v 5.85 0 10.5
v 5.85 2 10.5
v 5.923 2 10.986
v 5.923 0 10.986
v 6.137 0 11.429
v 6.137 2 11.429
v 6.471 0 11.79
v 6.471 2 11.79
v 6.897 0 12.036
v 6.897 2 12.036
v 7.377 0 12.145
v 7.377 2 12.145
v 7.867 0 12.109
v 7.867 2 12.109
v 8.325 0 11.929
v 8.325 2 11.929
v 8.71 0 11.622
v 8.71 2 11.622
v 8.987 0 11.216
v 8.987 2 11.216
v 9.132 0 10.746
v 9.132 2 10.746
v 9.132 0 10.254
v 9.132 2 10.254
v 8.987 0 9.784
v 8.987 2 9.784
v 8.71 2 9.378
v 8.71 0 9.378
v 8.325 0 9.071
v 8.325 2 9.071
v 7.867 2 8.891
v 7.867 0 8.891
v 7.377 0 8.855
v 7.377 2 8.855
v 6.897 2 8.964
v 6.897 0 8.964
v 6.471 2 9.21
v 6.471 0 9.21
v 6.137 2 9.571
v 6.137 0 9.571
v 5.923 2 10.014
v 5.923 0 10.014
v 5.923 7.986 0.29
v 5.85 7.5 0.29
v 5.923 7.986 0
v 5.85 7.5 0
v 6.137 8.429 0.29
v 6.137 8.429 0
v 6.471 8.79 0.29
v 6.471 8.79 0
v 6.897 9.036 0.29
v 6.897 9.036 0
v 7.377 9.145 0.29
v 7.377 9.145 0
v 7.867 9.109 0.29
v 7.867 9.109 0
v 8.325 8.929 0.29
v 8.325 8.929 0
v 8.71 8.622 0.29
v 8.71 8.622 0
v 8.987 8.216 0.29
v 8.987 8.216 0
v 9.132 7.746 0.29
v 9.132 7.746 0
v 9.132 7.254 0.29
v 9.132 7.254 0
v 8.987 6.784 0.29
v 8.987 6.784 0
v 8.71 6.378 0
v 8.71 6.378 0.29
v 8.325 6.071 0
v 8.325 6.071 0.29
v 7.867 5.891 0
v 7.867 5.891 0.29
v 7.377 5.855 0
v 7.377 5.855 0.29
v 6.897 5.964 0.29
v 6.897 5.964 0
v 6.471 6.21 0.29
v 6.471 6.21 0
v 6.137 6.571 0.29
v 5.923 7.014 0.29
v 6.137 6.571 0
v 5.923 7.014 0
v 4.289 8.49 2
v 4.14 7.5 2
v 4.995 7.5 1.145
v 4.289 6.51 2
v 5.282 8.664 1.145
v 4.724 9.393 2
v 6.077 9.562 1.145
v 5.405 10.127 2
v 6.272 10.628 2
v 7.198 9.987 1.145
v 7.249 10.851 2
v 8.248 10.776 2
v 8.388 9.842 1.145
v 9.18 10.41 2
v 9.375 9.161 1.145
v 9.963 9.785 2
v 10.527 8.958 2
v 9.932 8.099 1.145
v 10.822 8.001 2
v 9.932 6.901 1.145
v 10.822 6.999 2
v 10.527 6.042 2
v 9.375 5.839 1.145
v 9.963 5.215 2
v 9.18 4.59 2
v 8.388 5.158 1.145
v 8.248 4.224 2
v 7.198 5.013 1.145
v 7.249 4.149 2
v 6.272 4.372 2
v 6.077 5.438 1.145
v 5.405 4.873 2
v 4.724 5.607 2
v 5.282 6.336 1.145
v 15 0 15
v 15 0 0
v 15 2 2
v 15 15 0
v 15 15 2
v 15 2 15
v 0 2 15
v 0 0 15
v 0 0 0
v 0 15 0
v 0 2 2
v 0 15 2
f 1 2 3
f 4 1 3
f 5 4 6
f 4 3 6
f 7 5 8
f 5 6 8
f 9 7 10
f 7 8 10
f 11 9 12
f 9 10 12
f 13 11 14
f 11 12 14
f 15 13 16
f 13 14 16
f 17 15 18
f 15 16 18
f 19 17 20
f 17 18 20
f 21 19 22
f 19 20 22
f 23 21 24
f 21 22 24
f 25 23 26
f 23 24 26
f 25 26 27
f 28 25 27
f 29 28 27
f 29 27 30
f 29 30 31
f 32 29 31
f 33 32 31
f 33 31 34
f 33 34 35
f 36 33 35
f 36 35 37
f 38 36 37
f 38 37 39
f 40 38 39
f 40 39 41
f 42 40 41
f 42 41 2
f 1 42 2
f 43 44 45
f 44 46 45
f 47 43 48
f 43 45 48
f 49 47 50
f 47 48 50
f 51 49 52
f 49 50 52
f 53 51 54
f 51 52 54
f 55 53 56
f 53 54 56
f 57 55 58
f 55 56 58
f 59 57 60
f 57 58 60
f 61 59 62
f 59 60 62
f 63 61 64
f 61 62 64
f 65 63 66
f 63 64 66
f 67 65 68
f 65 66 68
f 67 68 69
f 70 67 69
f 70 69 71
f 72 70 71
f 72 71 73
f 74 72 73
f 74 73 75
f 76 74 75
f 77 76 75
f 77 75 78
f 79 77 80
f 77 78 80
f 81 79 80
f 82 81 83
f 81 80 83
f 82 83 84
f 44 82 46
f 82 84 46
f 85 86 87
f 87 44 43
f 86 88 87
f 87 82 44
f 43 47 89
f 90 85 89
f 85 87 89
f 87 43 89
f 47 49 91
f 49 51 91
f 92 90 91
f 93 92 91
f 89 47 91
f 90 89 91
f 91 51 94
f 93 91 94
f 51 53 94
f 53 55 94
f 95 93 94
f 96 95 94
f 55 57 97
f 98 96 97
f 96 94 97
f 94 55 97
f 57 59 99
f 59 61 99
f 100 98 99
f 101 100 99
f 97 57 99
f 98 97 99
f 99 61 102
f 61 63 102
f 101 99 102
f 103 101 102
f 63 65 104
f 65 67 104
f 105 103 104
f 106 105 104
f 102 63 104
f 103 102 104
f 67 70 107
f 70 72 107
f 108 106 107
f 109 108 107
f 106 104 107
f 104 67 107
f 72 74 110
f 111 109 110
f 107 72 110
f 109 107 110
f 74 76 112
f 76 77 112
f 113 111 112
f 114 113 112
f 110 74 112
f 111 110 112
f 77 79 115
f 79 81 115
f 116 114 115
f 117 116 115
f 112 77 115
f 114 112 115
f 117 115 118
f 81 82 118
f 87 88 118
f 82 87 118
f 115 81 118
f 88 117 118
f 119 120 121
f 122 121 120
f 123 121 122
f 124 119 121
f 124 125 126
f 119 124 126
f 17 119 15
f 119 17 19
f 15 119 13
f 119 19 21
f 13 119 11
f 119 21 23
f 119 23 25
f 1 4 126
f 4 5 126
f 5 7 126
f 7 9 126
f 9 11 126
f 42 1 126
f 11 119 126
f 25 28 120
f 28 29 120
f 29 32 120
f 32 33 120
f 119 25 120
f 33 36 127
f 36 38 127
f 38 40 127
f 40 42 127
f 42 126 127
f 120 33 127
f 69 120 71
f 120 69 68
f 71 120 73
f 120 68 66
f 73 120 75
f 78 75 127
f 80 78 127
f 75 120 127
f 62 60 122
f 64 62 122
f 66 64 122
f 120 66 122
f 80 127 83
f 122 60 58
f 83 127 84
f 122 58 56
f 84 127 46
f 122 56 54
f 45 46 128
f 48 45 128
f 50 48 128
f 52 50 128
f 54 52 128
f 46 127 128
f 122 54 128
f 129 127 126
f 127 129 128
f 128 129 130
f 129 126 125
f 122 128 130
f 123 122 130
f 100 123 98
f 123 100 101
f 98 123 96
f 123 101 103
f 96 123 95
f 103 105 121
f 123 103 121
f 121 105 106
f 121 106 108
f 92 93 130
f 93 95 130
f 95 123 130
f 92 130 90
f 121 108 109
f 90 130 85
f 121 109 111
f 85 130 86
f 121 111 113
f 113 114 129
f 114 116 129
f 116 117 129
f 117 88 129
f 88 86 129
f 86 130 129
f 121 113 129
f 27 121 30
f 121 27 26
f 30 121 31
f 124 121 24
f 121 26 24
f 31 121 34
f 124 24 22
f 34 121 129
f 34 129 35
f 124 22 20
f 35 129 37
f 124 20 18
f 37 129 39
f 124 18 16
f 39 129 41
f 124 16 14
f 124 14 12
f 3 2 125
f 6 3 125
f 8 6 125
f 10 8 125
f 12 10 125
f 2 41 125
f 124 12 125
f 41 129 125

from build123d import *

# Parameters (mm, degrees)
F1_DEPTH       = 15
F3_D           = 3.3
F5_D           = 3.3
F5_CSINK_D     = 6.72
F5_CSINK_ANGLE = 90


with BuildPart() as f1:
    # F0 (on Right) → F1 (new body)
    with BuildSketch(Plane.YZ):
        Polygon((0, 15), (0, 0), (15, 0), (15, 2), (2, 2), (2, 15), align=None)
    extrude(amount=F1_DEPTH)

    # F3 (through all)
    with Locations(Plane.XZ):
        with Locations((7.5, 10.5)):
            Hole(F3_D / 2)

    # F5 (through all)
    with Locations(Plane.XY.offset(2)):
        with Locations((7.5, 7.5)):
            CounterSinkHole(F5_D / 2, F5_CSINK_D / 2, counter_sink_angle=F5_CSINK_ANGLE)


solid = f1.part
